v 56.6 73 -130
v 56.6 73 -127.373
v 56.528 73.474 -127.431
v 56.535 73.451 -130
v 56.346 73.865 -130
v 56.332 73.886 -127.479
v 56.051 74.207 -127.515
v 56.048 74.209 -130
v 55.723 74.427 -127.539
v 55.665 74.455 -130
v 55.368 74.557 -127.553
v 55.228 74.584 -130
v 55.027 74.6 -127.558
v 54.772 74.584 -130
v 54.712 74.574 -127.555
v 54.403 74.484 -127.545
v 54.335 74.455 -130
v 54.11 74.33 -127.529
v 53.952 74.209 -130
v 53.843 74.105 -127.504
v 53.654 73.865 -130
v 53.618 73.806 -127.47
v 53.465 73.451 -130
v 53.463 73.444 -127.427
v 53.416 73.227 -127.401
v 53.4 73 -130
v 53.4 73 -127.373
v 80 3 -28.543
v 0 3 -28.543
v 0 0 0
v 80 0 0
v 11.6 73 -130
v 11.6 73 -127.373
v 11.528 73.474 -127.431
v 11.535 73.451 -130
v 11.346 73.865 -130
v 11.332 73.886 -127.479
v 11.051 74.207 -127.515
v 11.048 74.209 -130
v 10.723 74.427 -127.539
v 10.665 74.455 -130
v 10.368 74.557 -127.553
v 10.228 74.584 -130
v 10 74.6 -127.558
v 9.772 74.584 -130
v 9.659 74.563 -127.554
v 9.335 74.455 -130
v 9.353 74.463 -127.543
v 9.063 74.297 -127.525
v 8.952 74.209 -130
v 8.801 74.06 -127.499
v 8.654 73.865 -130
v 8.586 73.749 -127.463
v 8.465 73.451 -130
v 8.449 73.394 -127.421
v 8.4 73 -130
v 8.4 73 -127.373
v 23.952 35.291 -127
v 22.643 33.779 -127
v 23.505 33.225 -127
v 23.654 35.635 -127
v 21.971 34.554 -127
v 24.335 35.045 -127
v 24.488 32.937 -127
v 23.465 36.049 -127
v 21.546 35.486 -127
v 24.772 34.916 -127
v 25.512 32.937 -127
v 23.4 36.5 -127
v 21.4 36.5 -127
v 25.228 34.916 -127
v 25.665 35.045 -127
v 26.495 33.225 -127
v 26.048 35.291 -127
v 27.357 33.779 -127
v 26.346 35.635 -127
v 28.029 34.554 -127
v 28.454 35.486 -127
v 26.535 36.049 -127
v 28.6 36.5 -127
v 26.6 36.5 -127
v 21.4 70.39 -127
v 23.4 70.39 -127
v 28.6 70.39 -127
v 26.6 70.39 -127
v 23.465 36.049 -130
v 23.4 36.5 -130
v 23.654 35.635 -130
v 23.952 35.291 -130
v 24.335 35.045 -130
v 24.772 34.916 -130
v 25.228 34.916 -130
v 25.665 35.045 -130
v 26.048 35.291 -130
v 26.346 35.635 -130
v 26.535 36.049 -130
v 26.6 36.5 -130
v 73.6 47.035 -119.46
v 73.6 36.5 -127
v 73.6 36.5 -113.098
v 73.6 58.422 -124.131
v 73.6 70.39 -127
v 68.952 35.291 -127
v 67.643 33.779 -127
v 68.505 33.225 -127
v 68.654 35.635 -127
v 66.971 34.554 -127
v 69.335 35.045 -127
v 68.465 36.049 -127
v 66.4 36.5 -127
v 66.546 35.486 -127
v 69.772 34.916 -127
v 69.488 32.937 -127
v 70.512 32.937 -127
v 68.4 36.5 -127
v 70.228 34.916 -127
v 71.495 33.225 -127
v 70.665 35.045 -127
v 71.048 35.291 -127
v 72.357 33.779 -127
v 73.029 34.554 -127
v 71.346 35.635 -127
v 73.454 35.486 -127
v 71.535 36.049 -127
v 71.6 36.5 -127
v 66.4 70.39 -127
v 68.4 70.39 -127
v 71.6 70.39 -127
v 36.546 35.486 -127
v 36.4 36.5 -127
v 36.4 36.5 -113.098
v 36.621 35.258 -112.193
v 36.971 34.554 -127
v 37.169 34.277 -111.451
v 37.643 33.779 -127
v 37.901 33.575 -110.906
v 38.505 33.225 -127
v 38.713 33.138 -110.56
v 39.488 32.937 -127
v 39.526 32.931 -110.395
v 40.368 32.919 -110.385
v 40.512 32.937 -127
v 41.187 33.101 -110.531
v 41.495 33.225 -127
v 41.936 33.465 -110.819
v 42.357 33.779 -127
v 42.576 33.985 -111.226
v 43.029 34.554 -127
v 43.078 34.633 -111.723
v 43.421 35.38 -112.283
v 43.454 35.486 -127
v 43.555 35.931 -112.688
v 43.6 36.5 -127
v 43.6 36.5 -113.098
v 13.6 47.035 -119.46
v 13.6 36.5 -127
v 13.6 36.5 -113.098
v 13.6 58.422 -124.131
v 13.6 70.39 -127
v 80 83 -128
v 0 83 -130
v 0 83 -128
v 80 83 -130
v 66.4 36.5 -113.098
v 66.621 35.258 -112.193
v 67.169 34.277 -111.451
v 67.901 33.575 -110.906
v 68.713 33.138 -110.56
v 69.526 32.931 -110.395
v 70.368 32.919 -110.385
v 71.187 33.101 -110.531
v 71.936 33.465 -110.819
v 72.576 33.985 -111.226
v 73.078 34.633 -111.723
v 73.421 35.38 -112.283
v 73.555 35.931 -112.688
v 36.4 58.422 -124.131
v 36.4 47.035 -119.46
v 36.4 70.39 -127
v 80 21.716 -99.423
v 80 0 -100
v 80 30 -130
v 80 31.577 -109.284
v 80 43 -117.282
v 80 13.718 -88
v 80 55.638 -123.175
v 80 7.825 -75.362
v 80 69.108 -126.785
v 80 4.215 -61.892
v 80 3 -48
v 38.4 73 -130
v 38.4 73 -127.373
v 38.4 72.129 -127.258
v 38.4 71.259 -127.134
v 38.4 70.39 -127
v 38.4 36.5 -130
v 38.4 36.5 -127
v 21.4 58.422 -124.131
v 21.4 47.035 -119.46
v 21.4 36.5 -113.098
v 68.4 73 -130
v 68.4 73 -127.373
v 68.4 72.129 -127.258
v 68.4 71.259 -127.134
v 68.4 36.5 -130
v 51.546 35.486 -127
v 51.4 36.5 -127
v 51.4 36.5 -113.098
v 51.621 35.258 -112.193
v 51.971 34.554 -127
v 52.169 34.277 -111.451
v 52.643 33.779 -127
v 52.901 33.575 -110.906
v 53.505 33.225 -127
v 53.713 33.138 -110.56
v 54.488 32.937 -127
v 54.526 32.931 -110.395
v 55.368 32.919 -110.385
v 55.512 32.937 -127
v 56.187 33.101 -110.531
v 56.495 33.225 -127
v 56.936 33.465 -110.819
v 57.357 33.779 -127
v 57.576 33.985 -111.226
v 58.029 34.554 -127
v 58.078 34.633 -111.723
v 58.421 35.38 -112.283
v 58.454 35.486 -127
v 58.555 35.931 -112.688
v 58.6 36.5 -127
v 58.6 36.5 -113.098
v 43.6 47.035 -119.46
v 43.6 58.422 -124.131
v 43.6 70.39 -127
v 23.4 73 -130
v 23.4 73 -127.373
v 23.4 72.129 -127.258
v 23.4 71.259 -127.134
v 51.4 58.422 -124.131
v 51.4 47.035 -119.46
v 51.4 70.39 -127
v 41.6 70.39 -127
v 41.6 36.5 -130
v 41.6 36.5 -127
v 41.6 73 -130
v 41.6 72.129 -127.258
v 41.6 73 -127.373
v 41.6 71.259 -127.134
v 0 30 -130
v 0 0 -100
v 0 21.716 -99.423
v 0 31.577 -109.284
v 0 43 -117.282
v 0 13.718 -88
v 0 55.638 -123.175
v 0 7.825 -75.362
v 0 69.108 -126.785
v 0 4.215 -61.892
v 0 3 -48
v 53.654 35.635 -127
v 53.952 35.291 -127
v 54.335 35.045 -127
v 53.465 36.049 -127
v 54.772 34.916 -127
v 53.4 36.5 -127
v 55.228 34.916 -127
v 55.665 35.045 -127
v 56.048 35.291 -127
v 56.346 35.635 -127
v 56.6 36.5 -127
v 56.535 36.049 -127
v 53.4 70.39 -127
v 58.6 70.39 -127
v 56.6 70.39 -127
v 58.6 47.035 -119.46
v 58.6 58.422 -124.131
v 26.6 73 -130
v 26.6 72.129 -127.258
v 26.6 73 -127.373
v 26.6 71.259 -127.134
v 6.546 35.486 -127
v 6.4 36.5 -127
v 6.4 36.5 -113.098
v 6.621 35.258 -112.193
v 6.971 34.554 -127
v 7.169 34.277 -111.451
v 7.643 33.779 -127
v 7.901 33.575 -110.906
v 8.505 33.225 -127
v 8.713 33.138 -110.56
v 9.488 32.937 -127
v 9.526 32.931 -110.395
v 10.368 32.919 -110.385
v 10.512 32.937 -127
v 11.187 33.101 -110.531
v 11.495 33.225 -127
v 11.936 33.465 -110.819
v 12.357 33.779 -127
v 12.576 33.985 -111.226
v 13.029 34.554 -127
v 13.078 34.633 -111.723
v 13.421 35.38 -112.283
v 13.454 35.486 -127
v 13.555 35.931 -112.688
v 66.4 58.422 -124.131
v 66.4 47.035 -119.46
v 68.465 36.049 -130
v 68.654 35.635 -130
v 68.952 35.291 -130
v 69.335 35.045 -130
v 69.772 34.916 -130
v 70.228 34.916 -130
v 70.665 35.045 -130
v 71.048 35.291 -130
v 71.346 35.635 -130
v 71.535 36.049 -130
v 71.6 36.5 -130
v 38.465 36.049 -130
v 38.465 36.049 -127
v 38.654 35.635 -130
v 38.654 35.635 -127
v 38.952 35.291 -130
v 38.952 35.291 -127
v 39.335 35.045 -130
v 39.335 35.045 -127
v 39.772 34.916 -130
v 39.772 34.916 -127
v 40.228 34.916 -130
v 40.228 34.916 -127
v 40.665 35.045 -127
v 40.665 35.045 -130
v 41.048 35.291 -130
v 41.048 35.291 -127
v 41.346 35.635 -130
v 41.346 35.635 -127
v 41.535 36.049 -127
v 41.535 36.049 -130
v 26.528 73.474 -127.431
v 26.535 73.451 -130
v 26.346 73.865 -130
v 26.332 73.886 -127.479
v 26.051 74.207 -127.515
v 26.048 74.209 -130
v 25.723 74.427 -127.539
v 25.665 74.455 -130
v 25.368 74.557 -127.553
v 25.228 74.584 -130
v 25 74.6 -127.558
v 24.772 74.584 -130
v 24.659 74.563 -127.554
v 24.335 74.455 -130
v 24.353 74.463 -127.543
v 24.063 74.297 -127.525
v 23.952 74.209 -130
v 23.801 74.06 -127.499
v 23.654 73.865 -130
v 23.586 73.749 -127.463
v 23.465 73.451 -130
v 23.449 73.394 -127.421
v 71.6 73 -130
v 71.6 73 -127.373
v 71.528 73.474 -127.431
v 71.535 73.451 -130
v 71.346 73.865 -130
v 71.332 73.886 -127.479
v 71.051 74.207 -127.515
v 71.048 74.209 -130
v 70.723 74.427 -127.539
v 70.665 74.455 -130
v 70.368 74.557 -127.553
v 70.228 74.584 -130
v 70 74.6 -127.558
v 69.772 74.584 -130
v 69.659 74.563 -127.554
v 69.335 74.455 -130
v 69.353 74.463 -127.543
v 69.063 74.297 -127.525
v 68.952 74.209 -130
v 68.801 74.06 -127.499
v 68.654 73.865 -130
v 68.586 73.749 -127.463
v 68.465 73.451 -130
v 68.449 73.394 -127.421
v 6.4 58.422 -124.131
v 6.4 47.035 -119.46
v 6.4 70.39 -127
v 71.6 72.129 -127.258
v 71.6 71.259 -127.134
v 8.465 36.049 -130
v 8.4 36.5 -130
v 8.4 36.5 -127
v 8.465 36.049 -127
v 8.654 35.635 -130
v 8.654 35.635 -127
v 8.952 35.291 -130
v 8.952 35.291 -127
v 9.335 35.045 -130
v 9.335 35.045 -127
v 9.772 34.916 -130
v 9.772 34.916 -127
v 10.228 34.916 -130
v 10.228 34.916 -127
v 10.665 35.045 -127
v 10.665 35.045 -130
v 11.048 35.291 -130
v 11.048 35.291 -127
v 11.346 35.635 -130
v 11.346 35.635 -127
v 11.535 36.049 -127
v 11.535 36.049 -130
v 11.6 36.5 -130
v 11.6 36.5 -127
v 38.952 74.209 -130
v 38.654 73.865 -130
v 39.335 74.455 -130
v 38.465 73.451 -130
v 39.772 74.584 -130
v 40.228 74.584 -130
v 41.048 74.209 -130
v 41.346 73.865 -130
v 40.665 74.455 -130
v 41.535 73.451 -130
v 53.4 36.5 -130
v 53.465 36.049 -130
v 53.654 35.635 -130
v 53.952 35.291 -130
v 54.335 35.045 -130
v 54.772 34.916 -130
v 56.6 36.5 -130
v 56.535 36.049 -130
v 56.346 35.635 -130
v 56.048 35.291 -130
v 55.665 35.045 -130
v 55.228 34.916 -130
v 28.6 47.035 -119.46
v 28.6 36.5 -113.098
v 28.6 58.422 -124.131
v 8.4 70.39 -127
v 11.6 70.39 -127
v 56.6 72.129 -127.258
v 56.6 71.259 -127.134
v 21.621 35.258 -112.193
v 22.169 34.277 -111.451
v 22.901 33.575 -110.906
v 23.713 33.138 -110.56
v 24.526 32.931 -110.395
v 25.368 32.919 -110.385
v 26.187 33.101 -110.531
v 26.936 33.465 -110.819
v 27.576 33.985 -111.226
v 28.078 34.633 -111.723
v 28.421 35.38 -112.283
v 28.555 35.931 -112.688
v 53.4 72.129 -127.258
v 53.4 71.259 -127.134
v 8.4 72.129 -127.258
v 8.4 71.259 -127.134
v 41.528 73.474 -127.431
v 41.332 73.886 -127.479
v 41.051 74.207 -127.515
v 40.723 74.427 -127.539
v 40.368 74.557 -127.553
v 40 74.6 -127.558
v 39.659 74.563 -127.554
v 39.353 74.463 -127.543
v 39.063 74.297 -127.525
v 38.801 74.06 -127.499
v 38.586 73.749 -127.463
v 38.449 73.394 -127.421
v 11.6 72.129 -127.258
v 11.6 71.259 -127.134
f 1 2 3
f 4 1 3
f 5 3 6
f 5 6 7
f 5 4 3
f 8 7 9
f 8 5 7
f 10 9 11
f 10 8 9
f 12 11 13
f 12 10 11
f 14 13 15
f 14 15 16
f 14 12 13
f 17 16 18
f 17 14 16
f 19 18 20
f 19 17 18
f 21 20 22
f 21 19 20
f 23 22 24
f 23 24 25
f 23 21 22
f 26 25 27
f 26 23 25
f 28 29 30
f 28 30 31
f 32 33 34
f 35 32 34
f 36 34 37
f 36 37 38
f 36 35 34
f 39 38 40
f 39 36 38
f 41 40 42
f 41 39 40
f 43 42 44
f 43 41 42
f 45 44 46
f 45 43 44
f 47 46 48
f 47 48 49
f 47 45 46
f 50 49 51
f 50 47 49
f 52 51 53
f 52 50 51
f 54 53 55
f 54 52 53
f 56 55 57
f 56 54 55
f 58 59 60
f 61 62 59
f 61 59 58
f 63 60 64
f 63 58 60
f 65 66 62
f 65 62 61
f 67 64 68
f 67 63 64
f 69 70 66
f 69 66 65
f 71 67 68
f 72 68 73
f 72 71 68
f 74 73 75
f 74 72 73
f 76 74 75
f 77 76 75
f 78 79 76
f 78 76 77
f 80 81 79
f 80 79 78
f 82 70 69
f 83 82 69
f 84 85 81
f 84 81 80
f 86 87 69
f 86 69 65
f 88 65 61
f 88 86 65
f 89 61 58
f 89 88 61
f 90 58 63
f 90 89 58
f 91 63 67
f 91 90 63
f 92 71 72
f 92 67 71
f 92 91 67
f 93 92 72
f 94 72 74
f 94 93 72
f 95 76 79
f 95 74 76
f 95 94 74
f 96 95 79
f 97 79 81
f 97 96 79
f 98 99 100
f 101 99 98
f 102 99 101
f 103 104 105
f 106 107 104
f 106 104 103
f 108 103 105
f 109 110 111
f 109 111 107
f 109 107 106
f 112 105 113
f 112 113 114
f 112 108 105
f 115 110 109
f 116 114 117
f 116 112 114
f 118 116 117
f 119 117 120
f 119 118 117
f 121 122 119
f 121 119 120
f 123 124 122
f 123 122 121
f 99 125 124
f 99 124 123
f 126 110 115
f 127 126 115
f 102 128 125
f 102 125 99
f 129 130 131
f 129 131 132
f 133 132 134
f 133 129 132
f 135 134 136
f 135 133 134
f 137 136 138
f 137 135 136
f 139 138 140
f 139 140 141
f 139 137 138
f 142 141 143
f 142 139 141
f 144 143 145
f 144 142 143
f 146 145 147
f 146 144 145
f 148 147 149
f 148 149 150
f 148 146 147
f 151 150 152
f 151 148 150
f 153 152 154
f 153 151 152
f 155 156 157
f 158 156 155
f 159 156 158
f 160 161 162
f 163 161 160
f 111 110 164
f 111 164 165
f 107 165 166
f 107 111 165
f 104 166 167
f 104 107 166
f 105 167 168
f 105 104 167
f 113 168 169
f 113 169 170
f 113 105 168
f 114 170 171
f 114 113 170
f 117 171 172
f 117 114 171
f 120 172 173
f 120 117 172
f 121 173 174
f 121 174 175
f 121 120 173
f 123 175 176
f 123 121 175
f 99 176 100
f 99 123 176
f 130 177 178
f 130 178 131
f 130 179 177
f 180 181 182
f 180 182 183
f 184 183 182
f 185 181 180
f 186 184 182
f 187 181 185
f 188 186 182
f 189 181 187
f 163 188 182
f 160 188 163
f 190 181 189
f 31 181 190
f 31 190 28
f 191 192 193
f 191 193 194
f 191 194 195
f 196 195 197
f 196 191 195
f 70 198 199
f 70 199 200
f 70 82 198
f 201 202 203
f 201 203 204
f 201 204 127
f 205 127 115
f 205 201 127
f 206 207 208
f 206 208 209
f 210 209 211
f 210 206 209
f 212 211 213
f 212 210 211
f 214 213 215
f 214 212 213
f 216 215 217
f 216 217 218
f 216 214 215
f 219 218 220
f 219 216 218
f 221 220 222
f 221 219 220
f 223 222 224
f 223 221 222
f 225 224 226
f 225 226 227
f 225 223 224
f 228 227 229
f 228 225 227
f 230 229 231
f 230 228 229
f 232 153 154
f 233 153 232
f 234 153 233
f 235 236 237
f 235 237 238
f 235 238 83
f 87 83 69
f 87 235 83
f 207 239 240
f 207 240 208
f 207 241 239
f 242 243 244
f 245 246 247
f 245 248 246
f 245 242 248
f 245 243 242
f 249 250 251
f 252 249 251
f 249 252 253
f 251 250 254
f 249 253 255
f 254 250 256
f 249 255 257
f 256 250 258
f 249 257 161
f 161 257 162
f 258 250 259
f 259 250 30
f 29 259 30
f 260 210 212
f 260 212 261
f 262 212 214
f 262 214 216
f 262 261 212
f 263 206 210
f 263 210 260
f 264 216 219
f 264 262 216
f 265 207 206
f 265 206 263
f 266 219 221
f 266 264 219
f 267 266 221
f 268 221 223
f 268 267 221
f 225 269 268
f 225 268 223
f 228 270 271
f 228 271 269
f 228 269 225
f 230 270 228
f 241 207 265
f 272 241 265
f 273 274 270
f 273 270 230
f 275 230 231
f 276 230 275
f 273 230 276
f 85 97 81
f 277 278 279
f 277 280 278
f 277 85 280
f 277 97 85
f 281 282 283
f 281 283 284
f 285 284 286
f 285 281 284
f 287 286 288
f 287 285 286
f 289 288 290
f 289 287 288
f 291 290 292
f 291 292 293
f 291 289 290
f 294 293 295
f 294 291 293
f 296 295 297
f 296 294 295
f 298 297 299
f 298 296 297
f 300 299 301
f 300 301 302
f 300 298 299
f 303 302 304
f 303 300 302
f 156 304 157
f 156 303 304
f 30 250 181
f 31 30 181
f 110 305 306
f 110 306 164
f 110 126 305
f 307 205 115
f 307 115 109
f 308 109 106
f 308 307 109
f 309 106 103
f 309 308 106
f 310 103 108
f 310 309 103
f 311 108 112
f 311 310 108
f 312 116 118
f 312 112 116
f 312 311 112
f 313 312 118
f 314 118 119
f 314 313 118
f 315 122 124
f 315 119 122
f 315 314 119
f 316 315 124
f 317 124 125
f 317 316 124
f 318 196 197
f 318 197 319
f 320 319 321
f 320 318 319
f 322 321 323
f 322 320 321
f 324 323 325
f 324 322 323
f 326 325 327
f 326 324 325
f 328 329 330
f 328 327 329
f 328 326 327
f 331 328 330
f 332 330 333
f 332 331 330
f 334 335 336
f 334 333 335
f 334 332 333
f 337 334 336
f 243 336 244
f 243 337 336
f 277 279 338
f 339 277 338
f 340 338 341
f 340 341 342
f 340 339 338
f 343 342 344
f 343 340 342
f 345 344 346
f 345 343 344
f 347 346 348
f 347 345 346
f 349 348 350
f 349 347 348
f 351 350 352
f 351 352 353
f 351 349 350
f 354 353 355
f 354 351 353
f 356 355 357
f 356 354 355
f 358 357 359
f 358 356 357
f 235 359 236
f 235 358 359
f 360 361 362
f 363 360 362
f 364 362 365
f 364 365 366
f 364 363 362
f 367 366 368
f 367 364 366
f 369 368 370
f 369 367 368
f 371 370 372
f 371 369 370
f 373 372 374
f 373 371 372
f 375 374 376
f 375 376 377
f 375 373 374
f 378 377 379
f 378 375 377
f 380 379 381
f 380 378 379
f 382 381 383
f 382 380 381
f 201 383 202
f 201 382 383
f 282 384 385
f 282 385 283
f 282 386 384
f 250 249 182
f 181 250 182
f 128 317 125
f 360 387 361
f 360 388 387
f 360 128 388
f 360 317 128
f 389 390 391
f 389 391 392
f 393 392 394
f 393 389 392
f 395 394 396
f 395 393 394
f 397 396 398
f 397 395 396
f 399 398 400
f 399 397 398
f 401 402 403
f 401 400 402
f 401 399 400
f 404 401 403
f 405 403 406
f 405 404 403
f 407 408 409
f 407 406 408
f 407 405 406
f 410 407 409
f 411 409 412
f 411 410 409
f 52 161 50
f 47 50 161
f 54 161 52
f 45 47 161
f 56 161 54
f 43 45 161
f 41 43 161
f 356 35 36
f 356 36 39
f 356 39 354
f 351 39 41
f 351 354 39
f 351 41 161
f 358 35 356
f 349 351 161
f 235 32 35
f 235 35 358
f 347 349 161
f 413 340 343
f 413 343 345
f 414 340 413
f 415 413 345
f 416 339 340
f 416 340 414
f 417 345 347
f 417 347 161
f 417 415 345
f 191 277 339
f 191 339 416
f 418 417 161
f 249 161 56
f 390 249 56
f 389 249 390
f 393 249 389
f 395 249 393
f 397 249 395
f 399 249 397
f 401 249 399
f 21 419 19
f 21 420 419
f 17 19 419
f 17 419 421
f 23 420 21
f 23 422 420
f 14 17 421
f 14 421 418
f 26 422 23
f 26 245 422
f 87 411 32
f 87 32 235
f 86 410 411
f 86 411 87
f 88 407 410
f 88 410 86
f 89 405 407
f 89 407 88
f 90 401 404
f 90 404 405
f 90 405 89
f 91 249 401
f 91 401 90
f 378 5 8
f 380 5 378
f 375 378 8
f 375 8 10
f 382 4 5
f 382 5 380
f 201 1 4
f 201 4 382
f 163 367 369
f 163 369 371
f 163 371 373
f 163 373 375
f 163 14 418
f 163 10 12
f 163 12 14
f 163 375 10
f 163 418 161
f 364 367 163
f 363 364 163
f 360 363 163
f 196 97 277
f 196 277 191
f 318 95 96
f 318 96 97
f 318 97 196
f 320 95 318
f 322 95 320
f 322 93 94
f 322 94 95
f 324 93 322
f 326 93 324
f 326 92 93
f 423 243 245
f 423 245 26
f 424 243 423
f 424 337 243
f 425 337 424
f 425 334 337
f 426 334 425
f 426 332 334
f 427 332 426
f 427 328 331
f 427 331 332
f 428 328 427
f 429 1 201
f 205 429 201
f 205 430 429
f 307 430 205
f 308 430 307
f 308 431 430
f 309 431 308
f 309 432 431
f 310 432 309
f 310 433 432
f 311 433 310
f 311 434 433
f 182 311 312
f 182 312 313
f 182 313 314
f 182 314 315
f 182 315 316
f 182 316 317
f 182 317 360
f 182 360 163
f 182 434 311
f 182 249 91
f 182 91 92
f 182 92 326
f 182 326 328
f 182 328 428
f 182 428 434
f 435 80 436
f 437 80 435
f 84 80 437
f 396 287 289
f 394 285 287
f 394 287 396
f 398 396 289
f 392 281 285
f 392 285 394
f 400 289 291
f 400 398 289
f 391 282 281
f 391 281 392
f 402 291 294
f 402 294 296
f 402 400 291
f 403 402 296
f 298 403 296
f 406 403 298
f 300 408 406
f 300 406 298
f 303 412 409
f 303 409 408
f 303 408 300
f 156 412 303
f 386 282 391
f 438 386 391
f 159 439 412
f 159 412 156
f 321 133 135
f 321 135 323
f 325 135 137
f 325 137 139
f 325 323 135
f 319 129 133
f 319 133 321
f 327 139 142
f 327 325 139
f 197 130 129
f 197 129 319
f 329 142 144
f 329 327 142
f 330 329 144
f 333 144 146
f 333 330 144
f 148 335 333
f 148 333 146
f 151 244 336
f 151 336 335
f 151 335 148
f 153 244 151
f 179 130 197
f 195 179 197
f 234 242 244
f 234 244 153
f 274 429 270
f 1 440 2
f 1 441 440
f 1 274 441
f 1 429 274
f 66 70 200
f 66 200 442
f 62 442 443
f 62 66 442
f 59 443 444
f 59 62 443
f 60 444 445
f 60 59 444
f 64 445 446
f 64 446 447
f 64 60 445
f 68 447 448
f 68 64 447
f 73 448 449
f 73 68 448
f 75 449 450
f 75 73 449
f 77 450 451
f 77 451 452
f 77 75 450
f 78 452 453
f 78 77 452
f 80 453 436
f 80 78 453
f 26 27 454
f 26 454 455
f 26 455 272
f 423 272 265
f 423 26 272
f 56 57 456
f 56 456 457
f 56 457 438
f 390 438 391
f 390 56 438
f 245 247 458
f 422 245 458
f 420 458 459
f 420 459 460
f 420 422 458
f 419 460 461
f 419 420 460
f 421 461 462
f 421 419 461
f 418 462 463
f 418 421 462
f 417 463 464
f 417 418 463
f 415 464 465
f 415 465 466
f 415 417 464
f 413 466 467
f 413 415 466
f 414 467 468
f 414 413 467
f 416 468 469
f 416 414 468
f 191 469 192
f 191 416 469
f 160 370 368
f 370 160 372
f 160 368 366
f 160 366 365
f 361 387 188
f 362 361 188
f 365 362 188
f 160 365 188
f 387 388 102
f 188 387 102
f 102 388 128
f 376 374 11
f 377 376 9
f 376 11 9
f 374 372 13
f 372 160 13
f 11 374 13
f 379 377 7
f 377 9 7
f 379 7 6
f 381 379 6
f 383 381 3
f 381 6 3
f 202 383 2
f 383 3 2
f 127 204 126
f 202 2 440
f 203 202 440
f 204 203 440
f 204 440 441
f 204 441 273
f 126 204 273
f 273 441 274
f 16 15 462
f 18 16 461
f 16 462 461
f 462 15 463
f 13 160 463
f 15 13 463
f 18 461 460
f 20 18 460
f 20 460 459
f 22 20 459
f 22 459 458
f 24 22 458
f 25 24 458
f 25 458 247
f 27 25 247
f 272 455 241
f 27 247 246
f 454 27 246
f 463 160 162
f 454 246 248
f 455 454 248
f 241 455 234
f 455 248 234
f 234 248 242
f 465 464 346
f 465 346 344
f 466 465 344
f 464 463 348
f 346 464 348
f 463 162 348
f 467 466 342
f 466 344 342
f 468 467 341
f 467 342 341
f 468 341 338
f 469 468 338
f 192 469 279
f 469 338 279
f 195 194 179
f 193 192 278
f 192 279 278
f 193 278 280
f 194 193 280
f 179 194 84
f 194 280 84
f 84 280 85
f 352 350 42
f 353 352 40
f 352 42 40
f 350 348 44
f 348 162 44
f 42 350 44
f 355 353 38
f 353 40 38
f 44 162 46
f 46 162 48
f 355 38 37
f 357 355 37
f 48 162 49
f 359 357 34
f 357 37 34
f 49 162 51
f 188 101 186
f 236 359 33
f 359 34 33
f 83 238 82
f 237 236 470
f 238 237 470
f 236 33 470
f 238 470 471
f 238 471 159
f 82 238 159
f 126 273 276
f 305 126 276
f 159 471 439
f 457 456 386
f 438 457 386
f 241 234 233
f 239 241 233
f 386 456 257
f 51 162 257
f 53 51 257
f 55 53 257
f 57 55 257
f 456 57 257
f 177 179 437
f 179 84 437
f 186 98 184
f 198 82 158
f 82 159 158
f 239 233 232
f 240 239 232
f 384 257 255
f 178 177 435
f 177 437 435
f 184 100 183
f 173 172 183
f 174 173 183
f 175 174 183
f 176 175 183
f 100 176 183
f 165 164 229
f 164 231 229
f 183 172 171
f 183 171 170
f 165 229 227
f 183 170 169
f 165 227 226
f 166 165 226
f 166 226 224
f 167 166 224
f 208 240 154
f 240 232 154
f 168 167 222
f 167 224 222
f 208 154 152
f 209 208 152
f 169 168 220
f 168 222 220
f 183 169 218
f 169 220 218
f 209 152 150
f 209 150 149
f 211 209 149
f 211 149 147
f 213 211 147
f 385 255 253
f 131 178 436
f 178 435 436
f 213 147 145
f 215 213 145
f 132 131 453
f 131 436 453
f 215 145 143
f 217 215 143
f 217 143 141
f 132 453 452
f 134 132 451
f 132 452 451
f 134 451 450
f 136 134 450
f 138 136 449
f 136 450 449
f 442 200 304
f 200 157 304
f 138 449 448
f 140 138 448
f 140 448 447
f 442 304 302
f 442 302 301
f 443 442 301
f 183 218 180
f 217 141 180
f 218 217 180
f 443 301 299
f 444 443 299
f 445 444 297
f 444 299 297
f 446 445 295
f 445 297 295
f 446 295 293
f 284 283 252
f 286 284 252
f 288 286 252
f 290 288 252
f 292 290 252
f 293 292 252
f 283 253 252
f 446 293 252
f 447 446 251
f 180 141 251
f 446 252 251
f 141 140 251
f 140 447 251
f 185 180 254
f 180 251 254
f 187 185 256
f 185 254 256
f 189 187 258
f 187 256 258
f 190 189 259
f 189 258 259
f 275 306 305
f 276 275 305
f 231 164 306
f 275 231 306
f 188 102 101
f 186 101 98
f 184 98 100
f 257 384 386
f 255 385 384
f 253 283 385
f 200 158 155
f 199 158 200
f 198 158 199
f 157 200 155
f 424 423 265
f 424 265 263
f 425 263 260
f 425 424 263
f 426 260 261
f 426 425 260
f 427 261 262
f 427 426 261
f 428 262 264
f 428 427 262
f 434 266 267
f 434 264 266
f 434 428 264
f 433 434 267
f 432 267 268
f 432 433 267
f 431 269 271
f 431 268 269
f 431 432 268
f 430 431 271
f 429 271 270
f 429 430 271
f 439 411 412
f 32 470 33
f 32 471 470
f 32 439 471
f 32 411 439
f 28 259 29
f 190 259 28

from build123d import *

# Parameters (mm, degrees)
SKETCH1_W           = 80
SKETCH1_H           = 130
BOSS_EXTRUDE1_DEPTH = 3
SKETCH2_W           = 80
SKETCH2_H           = 2
BOSS_EXTRUDE2_DEPTH = 80
FILLET1_DEPTH       = 80
CUT_EXTRUDE1_DEPTH  = 174.749820144
CUT_EXTRUDE2_START  = -3
CUT_EXTRUDE2_DEPTH  = 171.749820238
CHAMFER1_SIZE2      = 28.543093363
CHAMFER1_SIZE       = 3
CHAMFER2_SIZE       = 30


with BuildPart() as part:
    # Sketch1 → Boss-Extrude1 (new body)
    with BuildSketch(Plane(origin=(0, 0, 0), x_dir=(1, 0, 0), z_dir=(0, 1, 0))):
        with Locations((40, 65)):
            Rectangle(SKETCH1_W, SKETCH1_H)
    extrude(amount=BOSS_EXTRUDE1_DEPTH)

    # Sketch2 → Boss-Extrude2 (add)
    with BuildSketch(Plane(origin=(0, 3, 0), x_dir=(1, 0, 0), z_dir=(0, 1, 0))):
        with Locations((40, 129)):
            Rectangle(SKETCH2_W, SKETCH2_H)
    extrude(amount=BOSS_EXTRUDE2_DEPTH)

    # Fillet1: read off the stored shape, not the designer's step
    # Fillet1 outline → Fillet1 (add)
    with BuildSketch(Plane.YZ):
        with BuildLine():
            Line((3, -128), (83, -128))
            ThreePointArc((83, -128), (26.431457505, -104.568542495), (3, -48))
            Line((3, -48), (3, -128))
        make_face()
    extrude(amount=FILLET1_DEPTH)

    # Sketch3 → Cut-Extrude1 (cut, through all)
    with BuildSketch(Plane(origin=(0, 0, -130), x_dir=(-1, 0, 0), z_dir=(0, 0, -1))):
        with BuildLine():
            Line((-38.4, 73), (-38.4, 36.5))
            ThreePointArc((-38.4, 36.5), (-40, 34.9), (-41.6, 36.5))
            Line((-41.6, 36.5), (-41.6, 73))
            ThreePointArc((-41.6, 73), (-40, 74.6), (-38.4, 73))
        make_face()
        with BuildLine():
            Line((-53.4, 73), (-53.4, 36.5))
            ThreePointArc((-53.4, 36.5), (-55, 34.9), (-56.6, 36.5))
            Line((-56.6, 36.5), (-56.6, 73))
            ThreePointArc((-56.6, 73), (-55, 74.6), (-53.4, 73))
        make_face()
        with BuildLine():
            Line((-71.6, 36.5), (-71.6, 73))
            ThreePointArc((-71.6, 73), (-70, 74.6), (-68.4, 73))
            Line((-68.4, 73), (-68.4, 36.5))
            ThreePointArc((-68.4, 36.5), (-70, 34.9), (-71.6, 36.5))
        make_face()
        with BuildLine():
            Line((-23.4, 73), (-23.4, 36.5))
            ThreePointArc((-23.4, 36.5), (-25, 34.9), (-26.6, 36.5))
            Line((-26.6, 36.5), (-26.6, 73))
            ThreePointArc((-26.6, 73), (-25, 74.6), (-23.4, 73))
        make_face()
        with BuildLine():
            Line((-11.6, 36.5), (-11.6, 73))
            ThreePointArc((-11.6, 73), (-10, 74.6), (-8.4, 73))
            Line((-8.4, 73), (-8.4, 36.5))
            ThreePointArc((-8.4, 36.5), (-10, 34.9), (-11.6, 36.5))
        make_face()
    extrude(amount=-CUT_EXTRUDE1_DEPTH, mode=Mode.SUBTRACT)

    # Sketch4 → Cut-Extrude2 (cut, through all)
    with BuildSketch(Plane(origin=(0, 0, -130), x_dir=(-1, 0, 0), z_dir=(0, 0, -1)).offset(CUT_EXTRUDE2_START)):
        with BuildLine():
            Line((-66.4, 73), (-66.4, 36.5))
            ThreePointArc((-66.4, 36.5), (-70, 32.9), (-73.6, 36.5))
            Line((-73.6, 36.5), (-73.6, 73))
            ThreePointArc((-73.6, 73), (-70, 76.6), (-66.4, 73))
        make_face()
        with BuildLine():
            Line((-51.4, 73), (-51.4, 36.5))
            ThreePointArc((-51.4, 36.5), (-55, 32.9), (-58.6, 36.5))
            Line((-58.6, 36.5), (-58.6, 73))
            ThreePointArc((-58.6, 73), (-55, 76.6), (-51.4, 73))
        make_face()
        with BuildLine():
            Line((-43.6, 36.5), (-43.6, 73))
            ThreePointArc((-43.6, 73), (-40, 76.6), (-36.4, 73))
            Line((-36.4, 73), (-36.4, 36.5))
            ThreePointArc((-36.4, 36.5), (-40, 32.9), (-43.6, 36.5))
        make_face()
        with BuildLine():
            Line((-21.4, 73), (-21.4, 36.5))
            ThreePointArc((-21.4, 36.5), (-25, 32.9), (-28.6, 36.5))
            Line((-28.6, 36.5), (-28.6, 73))
            ThreePointArc((-28.6, 73), (-25, 76.6), (-21.4, 73))
        make_face()
        with BuildLine():
            Line((-13.6, 36.5), (-13.6, 73))
            ThreePointArc((-13.6, 73), (-10, 76.6), (-6.4, 73))
            Line((-6.4, 73), (-6.4, 36.5))
            ThreePointArc((-6.4, 36.5), (-10, 32.9), (-13.6, 36.5))
        make_face()
    extrude(amount=-CUT_EXTRUDE2_DEPTH, mode=Mode.SUBTRACT)

    # Chamfer1
    chamfer1_edges = [part.edges().sort_by_distance(p)[0] for p in [
        (40, 3, 0),
    ]]
    chamfer1_side = [part.faces().sort_by_distance(p)[0] for p in [
        (40, 2.94, 0),
    ]]
    chamfer(chamfer1_edges, length=CHAMFER1_SIZE - 0.0001, length2=CHAMFER1_SIZE2 - 0.0001, reference=chamfer1_side[0])  # a hair under: the kernel refuses the full size

    # Chamfer2
    chamfer2_edges = [part.edges().sort_by_distance(p)[0] for p in [
        (40, 0, -130),
    ]]
    chamfer(chamfer2_edges, length=CHAMFER2_SIZE)


solid = part.part
